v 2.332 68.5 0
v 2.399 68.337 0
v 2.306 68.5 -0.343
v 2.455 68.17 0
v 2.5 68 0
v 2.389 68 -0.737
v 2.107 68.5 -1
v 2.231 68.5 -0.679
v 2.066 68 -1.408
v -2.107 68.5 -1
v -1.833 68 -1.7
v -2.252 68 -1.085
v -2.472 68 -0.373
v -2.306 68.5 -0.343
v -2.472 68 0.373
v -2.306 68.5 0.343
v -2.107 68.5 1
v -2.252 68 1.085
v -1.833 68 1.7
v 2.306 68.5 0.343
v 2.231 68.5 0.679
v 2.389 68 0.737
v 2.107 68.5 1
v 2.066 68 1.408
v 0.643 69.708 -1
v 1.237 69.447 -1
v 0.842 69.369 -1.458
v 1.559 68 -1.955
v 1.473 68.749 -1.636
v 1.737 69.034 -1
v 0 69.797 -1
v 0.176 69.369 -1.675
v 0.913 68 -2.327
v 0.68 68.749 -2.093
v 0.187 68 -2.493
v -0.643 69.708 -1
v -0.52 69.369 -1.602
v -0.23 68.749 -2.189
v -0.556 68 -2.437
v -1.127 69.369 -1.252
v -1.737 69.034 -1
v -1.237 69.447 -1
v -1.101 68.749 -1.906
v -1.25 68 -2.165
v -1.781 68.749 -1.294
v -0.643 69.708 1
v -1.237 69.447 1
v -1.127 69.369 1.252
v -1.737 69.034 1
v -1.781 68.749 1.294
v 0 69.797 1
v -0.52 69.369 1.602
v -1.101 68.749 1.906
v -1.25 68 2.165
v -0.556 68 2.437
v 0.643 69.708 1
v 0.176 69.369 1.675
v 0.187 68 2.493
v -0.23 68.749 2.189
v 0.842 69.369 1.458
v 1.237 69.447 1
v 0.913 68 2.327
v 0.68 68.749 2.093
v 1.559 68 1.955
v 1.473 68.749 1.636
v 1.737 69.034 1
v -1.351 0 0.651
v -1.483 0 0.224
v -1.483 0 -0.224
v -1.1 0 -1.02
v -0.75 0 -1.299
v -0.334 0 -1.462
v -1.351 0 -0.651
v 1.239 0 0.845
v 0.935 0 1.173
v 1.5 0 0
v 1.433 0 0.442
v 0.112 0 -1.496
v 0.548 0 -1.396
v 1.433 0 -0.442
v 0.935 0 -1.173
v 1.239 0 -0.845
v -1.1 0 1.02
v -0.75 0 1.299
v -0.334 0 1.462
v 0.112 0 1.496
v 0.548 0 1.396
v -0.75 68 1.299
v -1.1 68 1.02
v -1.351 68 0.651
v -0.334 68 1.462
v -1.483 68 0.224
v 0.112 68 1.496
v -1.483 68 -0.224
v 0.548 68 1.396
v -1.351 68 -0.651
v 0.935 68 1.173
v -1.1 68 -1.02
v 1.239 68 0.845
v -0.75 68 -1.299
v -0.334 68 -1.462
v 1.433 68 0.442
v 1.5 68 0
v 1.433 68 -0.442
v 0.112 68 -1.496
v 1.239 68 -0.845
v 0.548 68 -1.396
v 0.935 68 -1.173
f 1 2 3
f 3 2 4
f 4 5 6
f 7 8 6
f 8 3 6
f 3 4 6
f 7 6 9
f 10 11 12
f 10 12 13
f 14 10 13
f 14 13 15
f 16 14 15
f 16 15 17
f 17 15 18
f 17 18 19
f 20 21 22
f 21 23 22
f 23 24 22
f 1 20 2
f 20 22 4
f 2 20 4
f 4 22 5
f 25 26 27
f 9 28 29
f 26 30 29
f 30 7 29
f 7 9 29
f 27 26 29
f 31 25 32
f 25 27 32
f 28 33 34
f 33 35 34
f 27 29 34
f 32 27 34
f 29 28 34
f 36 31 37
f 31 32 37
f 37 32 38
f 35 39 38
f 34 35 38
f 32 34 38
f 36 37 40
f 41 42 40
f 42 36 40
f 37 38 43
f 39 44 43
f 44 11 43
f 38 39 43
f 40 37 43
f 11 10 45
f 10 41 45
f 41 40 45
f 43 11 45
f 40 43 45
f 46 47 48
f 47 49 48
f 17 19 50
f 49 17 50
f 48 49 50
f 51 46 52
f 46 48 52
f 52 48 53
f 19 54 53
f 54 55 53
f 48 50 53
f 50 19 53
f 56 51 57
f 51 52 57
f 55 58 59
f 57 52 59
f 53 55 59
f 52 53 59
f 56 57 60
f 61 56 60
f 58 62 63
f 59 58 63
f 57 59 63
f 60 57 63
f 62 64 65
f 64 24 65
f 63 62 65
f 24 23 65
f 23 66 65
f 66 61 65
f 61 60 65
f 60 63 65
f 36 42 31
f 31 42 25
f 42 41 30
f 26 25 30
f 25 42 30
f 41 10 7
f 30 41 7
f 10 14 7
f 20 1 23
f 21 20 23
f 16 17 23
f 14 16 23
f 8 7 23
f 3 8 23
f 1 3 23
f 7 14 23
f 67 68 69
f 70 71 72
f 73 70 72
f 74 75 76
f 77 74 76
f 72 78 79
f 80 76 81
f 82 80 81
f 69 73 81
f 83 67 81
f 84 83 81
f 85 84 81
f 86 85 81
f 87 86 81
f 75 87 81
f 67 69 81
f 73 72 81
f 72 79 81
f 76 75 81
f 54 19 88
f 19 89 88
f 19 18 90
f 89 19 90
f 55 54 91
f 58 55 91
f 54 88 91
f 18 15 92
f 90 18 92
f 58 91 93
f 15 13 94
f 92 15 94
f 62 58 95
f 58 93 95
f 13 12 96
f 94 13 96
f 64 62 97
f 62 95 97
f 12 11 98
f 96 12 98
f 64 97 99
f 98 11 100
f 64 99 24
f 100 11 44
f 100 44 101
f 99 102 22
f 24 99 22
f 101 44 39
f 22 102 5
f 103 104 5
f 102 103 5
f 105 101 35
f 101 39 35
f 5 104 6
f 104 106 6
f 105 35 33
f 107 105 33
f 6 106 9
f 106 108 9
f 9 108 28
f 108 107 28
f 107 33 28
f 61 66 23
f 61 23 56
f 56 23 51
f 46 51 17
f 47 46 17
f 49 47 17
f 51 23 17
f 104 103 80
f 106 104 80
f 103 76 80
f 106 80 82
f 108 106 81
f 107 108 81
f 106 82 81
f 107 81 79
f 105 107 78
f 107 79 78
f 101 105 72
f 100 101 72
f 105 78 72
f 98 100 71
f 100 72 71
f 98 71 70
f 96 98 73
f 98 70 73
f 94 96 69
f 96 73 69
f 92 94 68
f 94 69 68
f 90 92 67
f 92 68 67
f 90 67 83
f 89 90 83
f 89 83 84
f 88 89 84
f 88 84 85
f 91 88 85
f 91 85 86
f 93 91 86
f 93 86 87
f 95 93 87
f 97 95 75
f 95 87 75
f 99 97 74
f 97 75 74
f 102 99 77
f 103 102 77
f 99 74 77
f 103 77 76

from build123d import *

# Parameters (mm, degrees)
ENL_V_START             = -0.5
ENL_V_MAT_EXTRU_1_DEPTH = 10


with BuildPart() as part:
    # Esquisse1 → Révolution1 (revolve)
    with BuildSketch(Plane.XY):
        with BuildLine():
            Line((2.5, 68), (1.5, 68))
            Line((1.5, 68), (1.5, 0))
            Line((1.5, 0), (0, 0))
            Line((0, 0), (0, 70))
            ThreePointArc((0, 70), (1.600781059, 69.438476324), (2.5, 68))
        make_face()
    revolve(axis=Axis((0, 0, 0), (0, 1, 0)))

    # Esquisse2 → Enlèv. mat.-Extru.1 (cut)
    with BuildSketch(Plane.XZ.offset(-68).offset(ENL_V_START)):
        with BuildLine():
            Line((2.5, 1), (-4.803104299, 1))
            ThreePointArc((-4.803104299, 1), (-5.803104299, 0), (-4.803104299, -1))
            Line((-4.803104299, -1), (2.5, -1))
            ThreePointArc((2.5, -1), (3.5, 0), (2.5, 1))
        make_face()
    extrude(amount=-ENL_V_MAT_EXTRU_1_DEPTH, mode=Mode.SUBTRACT)


solid = part.part
